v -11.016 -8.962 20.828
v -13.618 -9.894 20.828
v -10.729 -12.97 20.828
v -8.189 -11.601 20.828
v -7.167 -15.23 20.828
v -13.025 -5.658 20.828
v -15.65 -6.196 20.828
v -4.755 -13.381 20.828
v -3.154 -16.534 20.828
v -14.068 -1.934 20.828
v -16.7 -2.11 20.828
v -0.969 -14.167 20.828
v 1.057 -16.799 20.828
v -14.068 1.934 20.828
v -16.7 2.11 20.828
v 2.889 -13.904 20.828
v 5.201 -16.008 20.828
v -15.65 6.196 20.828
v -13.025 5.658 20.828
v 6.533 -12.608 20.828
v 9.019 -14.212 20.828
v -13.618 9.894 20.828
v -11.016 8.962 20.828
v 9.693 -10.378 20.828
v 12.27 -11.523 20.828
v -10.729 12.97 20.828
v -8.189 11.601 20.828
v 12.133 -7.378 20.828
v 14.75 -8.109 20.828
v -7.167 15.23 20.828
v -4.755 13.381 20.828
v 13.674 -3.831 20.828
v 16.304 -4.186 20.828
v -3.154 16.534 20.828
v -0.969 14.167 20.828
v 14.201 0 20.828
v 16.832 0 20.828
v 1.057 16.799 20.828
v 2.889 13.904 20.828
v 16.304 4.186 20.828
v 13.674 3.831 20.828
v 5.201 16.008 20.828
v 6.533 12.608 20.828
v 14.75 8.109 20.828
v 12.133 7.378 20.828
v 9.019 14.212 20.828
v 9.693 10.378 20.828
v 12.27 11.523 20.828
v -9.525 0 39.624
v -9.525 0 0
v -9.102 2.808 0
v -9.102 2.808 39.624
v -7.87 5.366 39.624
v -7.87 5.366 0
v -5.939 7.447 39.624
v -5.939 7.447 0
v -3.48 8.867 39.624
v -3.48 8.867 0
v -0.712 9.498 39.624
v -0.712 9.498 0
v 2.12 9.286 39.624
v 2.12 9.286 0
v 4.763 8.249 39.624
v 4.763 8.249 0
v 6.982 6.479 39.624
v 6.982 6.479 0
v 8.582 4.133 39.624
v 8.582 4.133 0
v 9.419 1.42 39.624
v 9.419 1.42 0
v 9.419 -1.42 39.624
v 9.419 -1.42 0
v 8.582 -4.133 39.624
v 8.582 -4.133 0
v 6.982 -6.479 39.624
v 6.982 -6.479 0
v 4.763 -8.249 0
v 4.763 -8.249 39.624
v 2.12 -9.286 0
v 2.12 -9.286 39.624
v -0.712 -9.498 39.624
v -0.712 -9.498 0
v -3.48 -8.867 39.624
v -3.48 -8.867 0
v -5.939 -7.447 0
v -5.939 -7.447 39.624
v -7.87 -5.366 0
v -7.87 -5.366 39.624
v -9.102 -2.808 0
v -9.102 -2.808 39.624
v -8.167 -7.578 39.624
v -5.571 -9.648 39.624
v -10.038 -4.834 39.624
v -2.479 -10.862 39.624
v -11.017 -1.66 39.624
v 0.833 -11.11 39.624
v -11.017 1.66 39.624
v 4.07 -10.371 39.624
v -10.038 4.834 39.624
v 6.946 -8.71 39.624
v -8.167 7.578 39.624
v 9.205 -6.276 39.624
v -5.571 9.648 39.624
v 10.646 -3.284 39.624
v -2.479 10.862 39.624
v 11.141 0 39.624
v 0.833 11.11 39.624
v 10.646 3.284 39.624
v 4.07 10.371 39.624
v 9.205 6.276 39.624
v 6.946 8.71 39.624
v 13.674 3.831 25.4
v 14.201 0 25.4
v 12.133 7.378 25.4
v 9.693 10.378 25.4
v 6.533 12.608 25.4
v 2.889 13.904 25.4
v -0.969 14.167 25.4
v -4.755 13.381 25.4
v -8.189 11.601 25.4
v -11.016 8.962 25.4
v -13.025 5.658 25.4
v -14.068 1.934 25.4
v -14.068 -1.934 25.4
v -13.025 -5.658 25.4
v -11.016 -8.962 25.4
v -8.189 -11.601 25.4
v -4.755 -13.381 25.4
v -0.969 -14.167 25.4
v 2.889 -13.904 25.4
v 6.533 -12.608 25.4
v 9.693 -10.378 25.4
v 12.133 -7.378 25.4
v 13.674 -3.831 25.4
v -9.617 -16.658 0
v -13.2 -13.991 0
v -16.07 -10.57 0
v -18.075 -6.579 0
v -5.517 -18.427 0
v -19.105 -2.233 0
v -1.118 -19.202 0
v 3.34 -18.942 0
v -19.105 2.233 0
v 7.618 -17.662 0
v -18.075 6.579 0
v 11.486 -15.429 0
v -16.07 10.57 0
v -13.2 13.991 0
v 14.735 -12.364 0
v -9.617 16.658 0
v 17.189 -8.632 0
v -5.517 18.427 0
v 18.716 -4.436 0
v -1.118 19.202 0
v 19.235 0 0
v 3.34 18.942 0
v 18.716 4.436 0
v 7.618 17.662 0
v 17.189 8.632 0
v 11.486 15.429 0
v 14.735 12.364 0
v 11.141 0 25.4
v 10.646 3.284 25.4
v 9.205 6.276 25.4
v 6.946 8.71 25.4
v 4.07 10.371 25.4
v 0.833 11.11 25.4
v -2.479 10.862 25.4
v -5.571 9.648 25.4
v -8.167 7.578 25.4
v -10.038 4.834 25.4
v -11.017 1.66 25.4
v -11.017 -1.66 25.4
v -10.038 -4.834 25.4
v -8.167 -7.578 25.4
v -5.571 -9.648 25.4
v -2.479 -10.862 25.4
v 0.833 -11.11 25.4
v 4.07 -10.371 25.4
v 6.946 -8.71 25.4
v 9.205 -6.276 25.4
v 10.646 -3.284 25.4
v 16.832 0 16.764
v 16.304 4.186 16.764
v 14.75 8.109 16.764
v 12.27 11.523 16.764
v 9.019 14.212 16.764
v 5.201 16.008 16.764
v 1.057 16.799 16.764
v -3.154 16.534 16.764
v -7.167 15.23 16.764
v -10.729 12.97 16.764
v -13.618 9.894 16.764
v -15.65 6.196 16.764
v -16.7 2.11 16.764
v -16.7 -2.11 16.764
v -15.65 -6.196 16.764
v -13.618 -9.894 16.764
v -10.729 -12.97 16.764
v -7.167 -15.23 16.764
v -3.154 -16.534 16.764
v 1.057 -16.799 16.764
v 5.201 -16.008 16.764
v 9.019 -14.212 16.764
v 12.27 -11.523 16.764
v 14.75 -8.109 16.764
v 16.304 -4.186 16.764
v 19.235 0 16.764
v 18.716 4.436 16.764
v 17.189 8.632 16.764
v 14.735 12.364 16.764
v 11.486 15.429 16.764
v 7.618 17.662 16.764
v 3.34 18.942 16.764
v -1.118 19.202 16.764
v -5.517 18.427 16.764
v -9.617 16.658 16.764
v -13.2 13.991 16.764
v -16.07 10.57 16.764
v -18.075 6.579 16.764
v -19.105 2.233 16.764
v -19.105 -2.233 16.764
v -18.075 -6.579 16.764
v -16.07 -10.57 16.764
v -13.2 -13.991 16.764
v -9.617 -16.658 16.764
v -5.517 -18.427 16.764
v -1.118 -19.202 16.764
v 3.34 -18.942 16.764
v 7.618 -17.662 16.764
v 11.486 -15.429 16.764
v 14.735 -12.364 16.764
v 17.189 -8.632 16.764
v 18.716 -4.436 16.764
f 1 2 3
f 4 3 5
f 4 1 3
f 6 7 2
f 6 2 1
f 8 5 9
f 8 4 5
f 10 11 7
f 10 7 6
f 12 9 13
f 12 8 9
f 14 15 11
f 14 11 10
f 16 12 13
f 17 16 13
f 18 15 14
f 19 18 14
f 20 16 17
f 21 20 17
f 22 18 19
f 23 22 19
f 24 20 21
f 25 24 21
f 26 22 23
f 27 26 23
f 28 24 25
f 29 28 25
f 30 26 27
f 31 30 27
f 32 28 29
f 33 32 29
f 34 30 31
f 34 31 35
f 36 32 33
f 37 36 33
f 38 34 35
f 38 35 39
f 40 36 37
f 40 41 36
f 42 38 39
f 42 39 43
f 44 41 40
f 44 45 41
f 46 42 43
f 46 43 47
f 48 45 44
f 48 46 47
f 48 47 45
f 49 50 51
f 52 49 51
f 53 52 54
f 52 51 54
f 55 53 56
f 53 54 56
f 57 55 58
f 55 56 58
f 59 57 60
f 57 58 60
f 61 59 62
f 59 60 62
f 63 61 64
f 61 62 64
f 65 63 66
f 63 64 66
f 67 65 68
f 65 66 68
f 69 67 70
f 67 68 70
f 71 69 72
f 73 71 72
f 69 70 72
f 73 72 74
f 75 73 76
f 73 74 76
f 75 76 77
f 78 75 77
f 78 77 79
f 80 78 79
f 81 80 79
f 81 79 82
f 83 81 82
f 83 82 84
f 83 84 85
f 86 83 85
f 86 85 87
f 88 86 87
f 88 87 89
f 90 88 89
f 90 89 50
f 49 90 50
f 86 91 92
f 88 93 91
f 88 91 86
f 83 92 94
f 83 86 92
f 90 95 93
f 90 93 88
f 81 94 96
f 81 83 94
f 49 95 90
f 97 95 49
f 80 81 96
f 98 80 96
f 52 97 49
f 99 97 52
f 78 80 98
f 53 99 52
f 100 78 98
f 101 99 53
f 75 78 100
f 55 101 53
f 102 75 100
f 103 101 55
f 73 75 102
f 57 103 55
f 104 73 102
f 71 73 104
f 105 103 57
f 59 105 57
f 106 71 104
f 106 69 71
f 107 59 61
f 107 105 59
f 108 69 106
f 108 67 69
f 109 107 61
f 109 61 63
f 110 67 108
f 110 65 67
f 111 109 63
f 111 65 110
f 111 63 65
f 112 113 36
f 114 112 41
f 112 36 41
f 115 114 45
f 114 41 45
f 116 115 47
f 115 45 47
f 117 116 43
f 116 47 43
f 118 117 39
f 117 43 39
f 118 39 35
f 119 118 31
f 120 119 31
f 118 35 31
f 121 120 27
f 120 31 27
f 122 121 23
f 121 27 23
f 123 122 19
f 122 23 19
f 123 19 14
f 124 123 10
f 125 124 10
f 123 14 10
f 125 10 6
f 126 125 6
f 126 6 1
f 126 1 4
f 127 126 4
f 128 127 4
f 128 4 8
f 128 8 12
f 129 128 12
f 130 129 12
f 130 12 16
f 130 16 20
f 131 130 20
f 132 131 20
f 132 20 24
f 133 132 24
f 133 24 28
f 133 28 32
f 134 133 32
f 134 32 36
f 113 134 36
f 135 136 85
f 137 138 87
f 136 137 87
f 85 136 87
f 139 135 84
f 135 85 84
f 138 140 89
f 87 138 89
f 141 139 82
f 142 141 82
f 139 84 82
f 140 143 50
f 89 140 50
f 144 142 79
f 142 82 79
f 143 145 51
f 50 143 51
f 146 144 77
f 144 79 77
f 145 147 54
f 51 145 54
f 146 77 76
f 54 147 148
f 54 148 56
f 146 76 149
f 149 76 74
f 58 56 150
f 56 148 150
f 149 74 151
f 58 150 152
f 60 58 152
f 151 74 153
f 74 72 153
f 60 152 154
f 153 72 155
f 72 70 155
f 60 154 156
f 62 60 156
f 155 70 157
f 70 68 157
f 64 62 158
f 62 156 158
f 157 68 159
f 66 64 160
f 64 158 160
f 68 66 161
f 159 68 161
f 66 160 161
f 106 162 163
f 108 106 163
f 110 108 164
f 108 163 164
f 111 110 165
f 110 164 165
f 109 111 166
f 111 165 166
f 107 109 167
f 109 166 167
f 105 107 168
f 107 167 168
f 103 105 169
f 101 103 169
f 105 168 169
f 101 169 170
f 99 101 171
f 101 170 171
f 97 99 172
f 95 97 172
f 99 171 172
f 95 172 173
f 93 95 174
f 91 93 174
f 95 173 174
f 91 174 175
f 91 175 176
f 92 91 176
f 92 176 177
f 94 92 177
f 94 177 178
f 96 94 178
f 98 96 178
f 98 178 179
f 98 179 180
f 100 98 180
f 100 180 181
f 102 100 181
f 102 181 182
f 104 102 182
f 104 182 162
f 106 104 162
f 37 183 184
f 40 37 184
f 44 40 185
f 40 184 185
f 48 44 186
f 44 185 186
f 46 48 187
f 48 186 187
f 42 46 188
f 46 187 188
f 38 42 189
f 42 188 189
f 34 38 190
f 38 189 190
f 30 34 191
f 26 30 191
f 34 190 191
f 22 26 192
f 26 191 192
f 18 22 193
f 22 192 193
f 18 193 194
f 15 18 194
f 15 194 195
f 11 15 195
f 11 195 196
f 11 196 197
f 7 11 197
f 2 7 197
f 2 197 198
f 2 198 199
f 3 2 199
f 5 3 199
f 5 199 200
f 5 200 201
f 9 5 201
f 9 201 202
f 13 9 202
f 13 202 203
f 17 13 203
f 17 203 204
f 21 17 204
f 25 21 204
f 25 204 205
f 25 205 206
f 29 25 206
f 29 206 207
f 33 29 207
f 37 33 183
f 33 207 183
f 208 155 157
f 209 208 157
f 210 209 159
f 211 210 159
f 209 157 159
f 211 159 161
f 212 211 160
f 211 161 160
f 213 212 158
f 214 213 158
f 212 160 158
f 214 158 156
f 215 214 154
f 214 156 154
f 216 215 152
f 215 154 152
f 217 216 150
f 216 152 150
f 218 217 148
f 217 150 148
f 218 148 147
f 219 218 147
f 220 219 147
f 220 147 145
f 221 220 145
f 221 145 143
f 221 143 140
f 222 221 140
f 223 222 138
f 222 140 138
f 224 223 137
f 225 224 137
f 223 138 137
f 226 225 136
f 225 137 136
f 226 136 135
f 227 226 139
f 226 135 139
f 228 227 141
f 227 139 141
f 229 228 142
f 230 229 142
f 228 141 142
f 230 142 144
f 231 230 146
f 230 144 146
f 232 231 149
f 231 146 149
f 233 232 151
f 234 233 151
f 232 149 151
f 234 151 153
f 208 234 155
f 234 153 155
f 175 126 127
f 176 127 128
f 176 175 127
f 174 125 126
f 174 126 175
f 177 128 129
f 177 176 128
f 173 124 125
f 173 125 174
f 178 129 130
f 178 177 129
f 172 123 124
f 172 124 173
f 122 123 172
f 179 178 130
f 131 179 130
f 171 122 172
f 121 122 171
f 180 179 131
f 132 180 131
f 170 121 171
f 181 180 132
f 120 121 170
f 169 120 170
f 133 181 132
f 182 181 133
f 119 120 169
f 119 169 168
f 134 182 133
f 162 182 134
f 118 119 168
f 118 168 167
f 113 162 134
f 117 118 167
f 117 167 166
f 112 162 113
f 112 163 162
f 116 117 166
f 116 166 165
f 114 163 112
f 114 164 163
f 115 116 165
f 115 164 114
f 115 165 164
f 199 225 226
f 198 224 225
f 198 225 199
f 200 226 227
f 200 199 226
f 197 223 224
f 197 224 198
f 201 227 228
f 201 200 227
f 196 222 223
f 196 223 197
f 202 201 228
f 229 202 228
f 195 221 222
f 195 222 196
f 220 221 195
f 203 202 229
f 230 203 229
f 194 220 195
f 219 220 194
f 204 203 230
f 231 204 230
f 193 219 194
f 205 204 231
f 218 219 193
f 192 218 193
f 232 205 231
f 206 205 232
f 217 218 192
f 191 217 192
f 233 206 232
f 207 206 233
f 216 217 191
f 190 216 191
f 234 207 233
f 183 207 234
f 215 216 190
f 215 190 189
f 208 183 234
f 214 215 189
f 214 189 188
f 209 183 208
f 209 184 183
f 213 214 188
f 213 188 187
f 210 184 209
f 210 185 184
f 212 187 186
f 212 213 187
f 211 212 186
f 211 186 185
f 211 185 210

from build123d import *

# Parameters (mm, degrees)
F0_R     = 19.2346
F1_DEPTH = 16.764
F2_R     = 16.832332
F3_DEPTH = 20.828
F4_R     = 14.200523
F5_DEPTH = 25.4
F6_R     = 11.141094
F7_DEPTH = 39.624
F9_D     = 19.05


with BuildPart() as f1:
    # F0 (on Top) → F1 (new body)
    with BuildSketch(Plane.XY):
        Circle(F0_R)
    extrude(amount=F1_DEPTH)

    # F2 (on Top) → F3 (join)
    with BuildSketch(Plane.XY):
        Circle(F2_R)
    extrude(amount=F3_DEPTH)

    # F4 (on Top) → F5 (join)
    with BuildSketch(Plane.XY):
        Circle(F4_R)
    extrude(amount=F5_DEPTH)

    # F6 (on Top) → F7 (join)
    with BuildSketch(Plane.XY):
        Circle(F6_R)
    extrude(amount=F7_DEPTH)

    # F9 (through all)
    with Locations(Plane.XY.offset(39.624)):
        with Locations((0, 0)):
            Hole(F9_D / 2)


solid = f1.part
